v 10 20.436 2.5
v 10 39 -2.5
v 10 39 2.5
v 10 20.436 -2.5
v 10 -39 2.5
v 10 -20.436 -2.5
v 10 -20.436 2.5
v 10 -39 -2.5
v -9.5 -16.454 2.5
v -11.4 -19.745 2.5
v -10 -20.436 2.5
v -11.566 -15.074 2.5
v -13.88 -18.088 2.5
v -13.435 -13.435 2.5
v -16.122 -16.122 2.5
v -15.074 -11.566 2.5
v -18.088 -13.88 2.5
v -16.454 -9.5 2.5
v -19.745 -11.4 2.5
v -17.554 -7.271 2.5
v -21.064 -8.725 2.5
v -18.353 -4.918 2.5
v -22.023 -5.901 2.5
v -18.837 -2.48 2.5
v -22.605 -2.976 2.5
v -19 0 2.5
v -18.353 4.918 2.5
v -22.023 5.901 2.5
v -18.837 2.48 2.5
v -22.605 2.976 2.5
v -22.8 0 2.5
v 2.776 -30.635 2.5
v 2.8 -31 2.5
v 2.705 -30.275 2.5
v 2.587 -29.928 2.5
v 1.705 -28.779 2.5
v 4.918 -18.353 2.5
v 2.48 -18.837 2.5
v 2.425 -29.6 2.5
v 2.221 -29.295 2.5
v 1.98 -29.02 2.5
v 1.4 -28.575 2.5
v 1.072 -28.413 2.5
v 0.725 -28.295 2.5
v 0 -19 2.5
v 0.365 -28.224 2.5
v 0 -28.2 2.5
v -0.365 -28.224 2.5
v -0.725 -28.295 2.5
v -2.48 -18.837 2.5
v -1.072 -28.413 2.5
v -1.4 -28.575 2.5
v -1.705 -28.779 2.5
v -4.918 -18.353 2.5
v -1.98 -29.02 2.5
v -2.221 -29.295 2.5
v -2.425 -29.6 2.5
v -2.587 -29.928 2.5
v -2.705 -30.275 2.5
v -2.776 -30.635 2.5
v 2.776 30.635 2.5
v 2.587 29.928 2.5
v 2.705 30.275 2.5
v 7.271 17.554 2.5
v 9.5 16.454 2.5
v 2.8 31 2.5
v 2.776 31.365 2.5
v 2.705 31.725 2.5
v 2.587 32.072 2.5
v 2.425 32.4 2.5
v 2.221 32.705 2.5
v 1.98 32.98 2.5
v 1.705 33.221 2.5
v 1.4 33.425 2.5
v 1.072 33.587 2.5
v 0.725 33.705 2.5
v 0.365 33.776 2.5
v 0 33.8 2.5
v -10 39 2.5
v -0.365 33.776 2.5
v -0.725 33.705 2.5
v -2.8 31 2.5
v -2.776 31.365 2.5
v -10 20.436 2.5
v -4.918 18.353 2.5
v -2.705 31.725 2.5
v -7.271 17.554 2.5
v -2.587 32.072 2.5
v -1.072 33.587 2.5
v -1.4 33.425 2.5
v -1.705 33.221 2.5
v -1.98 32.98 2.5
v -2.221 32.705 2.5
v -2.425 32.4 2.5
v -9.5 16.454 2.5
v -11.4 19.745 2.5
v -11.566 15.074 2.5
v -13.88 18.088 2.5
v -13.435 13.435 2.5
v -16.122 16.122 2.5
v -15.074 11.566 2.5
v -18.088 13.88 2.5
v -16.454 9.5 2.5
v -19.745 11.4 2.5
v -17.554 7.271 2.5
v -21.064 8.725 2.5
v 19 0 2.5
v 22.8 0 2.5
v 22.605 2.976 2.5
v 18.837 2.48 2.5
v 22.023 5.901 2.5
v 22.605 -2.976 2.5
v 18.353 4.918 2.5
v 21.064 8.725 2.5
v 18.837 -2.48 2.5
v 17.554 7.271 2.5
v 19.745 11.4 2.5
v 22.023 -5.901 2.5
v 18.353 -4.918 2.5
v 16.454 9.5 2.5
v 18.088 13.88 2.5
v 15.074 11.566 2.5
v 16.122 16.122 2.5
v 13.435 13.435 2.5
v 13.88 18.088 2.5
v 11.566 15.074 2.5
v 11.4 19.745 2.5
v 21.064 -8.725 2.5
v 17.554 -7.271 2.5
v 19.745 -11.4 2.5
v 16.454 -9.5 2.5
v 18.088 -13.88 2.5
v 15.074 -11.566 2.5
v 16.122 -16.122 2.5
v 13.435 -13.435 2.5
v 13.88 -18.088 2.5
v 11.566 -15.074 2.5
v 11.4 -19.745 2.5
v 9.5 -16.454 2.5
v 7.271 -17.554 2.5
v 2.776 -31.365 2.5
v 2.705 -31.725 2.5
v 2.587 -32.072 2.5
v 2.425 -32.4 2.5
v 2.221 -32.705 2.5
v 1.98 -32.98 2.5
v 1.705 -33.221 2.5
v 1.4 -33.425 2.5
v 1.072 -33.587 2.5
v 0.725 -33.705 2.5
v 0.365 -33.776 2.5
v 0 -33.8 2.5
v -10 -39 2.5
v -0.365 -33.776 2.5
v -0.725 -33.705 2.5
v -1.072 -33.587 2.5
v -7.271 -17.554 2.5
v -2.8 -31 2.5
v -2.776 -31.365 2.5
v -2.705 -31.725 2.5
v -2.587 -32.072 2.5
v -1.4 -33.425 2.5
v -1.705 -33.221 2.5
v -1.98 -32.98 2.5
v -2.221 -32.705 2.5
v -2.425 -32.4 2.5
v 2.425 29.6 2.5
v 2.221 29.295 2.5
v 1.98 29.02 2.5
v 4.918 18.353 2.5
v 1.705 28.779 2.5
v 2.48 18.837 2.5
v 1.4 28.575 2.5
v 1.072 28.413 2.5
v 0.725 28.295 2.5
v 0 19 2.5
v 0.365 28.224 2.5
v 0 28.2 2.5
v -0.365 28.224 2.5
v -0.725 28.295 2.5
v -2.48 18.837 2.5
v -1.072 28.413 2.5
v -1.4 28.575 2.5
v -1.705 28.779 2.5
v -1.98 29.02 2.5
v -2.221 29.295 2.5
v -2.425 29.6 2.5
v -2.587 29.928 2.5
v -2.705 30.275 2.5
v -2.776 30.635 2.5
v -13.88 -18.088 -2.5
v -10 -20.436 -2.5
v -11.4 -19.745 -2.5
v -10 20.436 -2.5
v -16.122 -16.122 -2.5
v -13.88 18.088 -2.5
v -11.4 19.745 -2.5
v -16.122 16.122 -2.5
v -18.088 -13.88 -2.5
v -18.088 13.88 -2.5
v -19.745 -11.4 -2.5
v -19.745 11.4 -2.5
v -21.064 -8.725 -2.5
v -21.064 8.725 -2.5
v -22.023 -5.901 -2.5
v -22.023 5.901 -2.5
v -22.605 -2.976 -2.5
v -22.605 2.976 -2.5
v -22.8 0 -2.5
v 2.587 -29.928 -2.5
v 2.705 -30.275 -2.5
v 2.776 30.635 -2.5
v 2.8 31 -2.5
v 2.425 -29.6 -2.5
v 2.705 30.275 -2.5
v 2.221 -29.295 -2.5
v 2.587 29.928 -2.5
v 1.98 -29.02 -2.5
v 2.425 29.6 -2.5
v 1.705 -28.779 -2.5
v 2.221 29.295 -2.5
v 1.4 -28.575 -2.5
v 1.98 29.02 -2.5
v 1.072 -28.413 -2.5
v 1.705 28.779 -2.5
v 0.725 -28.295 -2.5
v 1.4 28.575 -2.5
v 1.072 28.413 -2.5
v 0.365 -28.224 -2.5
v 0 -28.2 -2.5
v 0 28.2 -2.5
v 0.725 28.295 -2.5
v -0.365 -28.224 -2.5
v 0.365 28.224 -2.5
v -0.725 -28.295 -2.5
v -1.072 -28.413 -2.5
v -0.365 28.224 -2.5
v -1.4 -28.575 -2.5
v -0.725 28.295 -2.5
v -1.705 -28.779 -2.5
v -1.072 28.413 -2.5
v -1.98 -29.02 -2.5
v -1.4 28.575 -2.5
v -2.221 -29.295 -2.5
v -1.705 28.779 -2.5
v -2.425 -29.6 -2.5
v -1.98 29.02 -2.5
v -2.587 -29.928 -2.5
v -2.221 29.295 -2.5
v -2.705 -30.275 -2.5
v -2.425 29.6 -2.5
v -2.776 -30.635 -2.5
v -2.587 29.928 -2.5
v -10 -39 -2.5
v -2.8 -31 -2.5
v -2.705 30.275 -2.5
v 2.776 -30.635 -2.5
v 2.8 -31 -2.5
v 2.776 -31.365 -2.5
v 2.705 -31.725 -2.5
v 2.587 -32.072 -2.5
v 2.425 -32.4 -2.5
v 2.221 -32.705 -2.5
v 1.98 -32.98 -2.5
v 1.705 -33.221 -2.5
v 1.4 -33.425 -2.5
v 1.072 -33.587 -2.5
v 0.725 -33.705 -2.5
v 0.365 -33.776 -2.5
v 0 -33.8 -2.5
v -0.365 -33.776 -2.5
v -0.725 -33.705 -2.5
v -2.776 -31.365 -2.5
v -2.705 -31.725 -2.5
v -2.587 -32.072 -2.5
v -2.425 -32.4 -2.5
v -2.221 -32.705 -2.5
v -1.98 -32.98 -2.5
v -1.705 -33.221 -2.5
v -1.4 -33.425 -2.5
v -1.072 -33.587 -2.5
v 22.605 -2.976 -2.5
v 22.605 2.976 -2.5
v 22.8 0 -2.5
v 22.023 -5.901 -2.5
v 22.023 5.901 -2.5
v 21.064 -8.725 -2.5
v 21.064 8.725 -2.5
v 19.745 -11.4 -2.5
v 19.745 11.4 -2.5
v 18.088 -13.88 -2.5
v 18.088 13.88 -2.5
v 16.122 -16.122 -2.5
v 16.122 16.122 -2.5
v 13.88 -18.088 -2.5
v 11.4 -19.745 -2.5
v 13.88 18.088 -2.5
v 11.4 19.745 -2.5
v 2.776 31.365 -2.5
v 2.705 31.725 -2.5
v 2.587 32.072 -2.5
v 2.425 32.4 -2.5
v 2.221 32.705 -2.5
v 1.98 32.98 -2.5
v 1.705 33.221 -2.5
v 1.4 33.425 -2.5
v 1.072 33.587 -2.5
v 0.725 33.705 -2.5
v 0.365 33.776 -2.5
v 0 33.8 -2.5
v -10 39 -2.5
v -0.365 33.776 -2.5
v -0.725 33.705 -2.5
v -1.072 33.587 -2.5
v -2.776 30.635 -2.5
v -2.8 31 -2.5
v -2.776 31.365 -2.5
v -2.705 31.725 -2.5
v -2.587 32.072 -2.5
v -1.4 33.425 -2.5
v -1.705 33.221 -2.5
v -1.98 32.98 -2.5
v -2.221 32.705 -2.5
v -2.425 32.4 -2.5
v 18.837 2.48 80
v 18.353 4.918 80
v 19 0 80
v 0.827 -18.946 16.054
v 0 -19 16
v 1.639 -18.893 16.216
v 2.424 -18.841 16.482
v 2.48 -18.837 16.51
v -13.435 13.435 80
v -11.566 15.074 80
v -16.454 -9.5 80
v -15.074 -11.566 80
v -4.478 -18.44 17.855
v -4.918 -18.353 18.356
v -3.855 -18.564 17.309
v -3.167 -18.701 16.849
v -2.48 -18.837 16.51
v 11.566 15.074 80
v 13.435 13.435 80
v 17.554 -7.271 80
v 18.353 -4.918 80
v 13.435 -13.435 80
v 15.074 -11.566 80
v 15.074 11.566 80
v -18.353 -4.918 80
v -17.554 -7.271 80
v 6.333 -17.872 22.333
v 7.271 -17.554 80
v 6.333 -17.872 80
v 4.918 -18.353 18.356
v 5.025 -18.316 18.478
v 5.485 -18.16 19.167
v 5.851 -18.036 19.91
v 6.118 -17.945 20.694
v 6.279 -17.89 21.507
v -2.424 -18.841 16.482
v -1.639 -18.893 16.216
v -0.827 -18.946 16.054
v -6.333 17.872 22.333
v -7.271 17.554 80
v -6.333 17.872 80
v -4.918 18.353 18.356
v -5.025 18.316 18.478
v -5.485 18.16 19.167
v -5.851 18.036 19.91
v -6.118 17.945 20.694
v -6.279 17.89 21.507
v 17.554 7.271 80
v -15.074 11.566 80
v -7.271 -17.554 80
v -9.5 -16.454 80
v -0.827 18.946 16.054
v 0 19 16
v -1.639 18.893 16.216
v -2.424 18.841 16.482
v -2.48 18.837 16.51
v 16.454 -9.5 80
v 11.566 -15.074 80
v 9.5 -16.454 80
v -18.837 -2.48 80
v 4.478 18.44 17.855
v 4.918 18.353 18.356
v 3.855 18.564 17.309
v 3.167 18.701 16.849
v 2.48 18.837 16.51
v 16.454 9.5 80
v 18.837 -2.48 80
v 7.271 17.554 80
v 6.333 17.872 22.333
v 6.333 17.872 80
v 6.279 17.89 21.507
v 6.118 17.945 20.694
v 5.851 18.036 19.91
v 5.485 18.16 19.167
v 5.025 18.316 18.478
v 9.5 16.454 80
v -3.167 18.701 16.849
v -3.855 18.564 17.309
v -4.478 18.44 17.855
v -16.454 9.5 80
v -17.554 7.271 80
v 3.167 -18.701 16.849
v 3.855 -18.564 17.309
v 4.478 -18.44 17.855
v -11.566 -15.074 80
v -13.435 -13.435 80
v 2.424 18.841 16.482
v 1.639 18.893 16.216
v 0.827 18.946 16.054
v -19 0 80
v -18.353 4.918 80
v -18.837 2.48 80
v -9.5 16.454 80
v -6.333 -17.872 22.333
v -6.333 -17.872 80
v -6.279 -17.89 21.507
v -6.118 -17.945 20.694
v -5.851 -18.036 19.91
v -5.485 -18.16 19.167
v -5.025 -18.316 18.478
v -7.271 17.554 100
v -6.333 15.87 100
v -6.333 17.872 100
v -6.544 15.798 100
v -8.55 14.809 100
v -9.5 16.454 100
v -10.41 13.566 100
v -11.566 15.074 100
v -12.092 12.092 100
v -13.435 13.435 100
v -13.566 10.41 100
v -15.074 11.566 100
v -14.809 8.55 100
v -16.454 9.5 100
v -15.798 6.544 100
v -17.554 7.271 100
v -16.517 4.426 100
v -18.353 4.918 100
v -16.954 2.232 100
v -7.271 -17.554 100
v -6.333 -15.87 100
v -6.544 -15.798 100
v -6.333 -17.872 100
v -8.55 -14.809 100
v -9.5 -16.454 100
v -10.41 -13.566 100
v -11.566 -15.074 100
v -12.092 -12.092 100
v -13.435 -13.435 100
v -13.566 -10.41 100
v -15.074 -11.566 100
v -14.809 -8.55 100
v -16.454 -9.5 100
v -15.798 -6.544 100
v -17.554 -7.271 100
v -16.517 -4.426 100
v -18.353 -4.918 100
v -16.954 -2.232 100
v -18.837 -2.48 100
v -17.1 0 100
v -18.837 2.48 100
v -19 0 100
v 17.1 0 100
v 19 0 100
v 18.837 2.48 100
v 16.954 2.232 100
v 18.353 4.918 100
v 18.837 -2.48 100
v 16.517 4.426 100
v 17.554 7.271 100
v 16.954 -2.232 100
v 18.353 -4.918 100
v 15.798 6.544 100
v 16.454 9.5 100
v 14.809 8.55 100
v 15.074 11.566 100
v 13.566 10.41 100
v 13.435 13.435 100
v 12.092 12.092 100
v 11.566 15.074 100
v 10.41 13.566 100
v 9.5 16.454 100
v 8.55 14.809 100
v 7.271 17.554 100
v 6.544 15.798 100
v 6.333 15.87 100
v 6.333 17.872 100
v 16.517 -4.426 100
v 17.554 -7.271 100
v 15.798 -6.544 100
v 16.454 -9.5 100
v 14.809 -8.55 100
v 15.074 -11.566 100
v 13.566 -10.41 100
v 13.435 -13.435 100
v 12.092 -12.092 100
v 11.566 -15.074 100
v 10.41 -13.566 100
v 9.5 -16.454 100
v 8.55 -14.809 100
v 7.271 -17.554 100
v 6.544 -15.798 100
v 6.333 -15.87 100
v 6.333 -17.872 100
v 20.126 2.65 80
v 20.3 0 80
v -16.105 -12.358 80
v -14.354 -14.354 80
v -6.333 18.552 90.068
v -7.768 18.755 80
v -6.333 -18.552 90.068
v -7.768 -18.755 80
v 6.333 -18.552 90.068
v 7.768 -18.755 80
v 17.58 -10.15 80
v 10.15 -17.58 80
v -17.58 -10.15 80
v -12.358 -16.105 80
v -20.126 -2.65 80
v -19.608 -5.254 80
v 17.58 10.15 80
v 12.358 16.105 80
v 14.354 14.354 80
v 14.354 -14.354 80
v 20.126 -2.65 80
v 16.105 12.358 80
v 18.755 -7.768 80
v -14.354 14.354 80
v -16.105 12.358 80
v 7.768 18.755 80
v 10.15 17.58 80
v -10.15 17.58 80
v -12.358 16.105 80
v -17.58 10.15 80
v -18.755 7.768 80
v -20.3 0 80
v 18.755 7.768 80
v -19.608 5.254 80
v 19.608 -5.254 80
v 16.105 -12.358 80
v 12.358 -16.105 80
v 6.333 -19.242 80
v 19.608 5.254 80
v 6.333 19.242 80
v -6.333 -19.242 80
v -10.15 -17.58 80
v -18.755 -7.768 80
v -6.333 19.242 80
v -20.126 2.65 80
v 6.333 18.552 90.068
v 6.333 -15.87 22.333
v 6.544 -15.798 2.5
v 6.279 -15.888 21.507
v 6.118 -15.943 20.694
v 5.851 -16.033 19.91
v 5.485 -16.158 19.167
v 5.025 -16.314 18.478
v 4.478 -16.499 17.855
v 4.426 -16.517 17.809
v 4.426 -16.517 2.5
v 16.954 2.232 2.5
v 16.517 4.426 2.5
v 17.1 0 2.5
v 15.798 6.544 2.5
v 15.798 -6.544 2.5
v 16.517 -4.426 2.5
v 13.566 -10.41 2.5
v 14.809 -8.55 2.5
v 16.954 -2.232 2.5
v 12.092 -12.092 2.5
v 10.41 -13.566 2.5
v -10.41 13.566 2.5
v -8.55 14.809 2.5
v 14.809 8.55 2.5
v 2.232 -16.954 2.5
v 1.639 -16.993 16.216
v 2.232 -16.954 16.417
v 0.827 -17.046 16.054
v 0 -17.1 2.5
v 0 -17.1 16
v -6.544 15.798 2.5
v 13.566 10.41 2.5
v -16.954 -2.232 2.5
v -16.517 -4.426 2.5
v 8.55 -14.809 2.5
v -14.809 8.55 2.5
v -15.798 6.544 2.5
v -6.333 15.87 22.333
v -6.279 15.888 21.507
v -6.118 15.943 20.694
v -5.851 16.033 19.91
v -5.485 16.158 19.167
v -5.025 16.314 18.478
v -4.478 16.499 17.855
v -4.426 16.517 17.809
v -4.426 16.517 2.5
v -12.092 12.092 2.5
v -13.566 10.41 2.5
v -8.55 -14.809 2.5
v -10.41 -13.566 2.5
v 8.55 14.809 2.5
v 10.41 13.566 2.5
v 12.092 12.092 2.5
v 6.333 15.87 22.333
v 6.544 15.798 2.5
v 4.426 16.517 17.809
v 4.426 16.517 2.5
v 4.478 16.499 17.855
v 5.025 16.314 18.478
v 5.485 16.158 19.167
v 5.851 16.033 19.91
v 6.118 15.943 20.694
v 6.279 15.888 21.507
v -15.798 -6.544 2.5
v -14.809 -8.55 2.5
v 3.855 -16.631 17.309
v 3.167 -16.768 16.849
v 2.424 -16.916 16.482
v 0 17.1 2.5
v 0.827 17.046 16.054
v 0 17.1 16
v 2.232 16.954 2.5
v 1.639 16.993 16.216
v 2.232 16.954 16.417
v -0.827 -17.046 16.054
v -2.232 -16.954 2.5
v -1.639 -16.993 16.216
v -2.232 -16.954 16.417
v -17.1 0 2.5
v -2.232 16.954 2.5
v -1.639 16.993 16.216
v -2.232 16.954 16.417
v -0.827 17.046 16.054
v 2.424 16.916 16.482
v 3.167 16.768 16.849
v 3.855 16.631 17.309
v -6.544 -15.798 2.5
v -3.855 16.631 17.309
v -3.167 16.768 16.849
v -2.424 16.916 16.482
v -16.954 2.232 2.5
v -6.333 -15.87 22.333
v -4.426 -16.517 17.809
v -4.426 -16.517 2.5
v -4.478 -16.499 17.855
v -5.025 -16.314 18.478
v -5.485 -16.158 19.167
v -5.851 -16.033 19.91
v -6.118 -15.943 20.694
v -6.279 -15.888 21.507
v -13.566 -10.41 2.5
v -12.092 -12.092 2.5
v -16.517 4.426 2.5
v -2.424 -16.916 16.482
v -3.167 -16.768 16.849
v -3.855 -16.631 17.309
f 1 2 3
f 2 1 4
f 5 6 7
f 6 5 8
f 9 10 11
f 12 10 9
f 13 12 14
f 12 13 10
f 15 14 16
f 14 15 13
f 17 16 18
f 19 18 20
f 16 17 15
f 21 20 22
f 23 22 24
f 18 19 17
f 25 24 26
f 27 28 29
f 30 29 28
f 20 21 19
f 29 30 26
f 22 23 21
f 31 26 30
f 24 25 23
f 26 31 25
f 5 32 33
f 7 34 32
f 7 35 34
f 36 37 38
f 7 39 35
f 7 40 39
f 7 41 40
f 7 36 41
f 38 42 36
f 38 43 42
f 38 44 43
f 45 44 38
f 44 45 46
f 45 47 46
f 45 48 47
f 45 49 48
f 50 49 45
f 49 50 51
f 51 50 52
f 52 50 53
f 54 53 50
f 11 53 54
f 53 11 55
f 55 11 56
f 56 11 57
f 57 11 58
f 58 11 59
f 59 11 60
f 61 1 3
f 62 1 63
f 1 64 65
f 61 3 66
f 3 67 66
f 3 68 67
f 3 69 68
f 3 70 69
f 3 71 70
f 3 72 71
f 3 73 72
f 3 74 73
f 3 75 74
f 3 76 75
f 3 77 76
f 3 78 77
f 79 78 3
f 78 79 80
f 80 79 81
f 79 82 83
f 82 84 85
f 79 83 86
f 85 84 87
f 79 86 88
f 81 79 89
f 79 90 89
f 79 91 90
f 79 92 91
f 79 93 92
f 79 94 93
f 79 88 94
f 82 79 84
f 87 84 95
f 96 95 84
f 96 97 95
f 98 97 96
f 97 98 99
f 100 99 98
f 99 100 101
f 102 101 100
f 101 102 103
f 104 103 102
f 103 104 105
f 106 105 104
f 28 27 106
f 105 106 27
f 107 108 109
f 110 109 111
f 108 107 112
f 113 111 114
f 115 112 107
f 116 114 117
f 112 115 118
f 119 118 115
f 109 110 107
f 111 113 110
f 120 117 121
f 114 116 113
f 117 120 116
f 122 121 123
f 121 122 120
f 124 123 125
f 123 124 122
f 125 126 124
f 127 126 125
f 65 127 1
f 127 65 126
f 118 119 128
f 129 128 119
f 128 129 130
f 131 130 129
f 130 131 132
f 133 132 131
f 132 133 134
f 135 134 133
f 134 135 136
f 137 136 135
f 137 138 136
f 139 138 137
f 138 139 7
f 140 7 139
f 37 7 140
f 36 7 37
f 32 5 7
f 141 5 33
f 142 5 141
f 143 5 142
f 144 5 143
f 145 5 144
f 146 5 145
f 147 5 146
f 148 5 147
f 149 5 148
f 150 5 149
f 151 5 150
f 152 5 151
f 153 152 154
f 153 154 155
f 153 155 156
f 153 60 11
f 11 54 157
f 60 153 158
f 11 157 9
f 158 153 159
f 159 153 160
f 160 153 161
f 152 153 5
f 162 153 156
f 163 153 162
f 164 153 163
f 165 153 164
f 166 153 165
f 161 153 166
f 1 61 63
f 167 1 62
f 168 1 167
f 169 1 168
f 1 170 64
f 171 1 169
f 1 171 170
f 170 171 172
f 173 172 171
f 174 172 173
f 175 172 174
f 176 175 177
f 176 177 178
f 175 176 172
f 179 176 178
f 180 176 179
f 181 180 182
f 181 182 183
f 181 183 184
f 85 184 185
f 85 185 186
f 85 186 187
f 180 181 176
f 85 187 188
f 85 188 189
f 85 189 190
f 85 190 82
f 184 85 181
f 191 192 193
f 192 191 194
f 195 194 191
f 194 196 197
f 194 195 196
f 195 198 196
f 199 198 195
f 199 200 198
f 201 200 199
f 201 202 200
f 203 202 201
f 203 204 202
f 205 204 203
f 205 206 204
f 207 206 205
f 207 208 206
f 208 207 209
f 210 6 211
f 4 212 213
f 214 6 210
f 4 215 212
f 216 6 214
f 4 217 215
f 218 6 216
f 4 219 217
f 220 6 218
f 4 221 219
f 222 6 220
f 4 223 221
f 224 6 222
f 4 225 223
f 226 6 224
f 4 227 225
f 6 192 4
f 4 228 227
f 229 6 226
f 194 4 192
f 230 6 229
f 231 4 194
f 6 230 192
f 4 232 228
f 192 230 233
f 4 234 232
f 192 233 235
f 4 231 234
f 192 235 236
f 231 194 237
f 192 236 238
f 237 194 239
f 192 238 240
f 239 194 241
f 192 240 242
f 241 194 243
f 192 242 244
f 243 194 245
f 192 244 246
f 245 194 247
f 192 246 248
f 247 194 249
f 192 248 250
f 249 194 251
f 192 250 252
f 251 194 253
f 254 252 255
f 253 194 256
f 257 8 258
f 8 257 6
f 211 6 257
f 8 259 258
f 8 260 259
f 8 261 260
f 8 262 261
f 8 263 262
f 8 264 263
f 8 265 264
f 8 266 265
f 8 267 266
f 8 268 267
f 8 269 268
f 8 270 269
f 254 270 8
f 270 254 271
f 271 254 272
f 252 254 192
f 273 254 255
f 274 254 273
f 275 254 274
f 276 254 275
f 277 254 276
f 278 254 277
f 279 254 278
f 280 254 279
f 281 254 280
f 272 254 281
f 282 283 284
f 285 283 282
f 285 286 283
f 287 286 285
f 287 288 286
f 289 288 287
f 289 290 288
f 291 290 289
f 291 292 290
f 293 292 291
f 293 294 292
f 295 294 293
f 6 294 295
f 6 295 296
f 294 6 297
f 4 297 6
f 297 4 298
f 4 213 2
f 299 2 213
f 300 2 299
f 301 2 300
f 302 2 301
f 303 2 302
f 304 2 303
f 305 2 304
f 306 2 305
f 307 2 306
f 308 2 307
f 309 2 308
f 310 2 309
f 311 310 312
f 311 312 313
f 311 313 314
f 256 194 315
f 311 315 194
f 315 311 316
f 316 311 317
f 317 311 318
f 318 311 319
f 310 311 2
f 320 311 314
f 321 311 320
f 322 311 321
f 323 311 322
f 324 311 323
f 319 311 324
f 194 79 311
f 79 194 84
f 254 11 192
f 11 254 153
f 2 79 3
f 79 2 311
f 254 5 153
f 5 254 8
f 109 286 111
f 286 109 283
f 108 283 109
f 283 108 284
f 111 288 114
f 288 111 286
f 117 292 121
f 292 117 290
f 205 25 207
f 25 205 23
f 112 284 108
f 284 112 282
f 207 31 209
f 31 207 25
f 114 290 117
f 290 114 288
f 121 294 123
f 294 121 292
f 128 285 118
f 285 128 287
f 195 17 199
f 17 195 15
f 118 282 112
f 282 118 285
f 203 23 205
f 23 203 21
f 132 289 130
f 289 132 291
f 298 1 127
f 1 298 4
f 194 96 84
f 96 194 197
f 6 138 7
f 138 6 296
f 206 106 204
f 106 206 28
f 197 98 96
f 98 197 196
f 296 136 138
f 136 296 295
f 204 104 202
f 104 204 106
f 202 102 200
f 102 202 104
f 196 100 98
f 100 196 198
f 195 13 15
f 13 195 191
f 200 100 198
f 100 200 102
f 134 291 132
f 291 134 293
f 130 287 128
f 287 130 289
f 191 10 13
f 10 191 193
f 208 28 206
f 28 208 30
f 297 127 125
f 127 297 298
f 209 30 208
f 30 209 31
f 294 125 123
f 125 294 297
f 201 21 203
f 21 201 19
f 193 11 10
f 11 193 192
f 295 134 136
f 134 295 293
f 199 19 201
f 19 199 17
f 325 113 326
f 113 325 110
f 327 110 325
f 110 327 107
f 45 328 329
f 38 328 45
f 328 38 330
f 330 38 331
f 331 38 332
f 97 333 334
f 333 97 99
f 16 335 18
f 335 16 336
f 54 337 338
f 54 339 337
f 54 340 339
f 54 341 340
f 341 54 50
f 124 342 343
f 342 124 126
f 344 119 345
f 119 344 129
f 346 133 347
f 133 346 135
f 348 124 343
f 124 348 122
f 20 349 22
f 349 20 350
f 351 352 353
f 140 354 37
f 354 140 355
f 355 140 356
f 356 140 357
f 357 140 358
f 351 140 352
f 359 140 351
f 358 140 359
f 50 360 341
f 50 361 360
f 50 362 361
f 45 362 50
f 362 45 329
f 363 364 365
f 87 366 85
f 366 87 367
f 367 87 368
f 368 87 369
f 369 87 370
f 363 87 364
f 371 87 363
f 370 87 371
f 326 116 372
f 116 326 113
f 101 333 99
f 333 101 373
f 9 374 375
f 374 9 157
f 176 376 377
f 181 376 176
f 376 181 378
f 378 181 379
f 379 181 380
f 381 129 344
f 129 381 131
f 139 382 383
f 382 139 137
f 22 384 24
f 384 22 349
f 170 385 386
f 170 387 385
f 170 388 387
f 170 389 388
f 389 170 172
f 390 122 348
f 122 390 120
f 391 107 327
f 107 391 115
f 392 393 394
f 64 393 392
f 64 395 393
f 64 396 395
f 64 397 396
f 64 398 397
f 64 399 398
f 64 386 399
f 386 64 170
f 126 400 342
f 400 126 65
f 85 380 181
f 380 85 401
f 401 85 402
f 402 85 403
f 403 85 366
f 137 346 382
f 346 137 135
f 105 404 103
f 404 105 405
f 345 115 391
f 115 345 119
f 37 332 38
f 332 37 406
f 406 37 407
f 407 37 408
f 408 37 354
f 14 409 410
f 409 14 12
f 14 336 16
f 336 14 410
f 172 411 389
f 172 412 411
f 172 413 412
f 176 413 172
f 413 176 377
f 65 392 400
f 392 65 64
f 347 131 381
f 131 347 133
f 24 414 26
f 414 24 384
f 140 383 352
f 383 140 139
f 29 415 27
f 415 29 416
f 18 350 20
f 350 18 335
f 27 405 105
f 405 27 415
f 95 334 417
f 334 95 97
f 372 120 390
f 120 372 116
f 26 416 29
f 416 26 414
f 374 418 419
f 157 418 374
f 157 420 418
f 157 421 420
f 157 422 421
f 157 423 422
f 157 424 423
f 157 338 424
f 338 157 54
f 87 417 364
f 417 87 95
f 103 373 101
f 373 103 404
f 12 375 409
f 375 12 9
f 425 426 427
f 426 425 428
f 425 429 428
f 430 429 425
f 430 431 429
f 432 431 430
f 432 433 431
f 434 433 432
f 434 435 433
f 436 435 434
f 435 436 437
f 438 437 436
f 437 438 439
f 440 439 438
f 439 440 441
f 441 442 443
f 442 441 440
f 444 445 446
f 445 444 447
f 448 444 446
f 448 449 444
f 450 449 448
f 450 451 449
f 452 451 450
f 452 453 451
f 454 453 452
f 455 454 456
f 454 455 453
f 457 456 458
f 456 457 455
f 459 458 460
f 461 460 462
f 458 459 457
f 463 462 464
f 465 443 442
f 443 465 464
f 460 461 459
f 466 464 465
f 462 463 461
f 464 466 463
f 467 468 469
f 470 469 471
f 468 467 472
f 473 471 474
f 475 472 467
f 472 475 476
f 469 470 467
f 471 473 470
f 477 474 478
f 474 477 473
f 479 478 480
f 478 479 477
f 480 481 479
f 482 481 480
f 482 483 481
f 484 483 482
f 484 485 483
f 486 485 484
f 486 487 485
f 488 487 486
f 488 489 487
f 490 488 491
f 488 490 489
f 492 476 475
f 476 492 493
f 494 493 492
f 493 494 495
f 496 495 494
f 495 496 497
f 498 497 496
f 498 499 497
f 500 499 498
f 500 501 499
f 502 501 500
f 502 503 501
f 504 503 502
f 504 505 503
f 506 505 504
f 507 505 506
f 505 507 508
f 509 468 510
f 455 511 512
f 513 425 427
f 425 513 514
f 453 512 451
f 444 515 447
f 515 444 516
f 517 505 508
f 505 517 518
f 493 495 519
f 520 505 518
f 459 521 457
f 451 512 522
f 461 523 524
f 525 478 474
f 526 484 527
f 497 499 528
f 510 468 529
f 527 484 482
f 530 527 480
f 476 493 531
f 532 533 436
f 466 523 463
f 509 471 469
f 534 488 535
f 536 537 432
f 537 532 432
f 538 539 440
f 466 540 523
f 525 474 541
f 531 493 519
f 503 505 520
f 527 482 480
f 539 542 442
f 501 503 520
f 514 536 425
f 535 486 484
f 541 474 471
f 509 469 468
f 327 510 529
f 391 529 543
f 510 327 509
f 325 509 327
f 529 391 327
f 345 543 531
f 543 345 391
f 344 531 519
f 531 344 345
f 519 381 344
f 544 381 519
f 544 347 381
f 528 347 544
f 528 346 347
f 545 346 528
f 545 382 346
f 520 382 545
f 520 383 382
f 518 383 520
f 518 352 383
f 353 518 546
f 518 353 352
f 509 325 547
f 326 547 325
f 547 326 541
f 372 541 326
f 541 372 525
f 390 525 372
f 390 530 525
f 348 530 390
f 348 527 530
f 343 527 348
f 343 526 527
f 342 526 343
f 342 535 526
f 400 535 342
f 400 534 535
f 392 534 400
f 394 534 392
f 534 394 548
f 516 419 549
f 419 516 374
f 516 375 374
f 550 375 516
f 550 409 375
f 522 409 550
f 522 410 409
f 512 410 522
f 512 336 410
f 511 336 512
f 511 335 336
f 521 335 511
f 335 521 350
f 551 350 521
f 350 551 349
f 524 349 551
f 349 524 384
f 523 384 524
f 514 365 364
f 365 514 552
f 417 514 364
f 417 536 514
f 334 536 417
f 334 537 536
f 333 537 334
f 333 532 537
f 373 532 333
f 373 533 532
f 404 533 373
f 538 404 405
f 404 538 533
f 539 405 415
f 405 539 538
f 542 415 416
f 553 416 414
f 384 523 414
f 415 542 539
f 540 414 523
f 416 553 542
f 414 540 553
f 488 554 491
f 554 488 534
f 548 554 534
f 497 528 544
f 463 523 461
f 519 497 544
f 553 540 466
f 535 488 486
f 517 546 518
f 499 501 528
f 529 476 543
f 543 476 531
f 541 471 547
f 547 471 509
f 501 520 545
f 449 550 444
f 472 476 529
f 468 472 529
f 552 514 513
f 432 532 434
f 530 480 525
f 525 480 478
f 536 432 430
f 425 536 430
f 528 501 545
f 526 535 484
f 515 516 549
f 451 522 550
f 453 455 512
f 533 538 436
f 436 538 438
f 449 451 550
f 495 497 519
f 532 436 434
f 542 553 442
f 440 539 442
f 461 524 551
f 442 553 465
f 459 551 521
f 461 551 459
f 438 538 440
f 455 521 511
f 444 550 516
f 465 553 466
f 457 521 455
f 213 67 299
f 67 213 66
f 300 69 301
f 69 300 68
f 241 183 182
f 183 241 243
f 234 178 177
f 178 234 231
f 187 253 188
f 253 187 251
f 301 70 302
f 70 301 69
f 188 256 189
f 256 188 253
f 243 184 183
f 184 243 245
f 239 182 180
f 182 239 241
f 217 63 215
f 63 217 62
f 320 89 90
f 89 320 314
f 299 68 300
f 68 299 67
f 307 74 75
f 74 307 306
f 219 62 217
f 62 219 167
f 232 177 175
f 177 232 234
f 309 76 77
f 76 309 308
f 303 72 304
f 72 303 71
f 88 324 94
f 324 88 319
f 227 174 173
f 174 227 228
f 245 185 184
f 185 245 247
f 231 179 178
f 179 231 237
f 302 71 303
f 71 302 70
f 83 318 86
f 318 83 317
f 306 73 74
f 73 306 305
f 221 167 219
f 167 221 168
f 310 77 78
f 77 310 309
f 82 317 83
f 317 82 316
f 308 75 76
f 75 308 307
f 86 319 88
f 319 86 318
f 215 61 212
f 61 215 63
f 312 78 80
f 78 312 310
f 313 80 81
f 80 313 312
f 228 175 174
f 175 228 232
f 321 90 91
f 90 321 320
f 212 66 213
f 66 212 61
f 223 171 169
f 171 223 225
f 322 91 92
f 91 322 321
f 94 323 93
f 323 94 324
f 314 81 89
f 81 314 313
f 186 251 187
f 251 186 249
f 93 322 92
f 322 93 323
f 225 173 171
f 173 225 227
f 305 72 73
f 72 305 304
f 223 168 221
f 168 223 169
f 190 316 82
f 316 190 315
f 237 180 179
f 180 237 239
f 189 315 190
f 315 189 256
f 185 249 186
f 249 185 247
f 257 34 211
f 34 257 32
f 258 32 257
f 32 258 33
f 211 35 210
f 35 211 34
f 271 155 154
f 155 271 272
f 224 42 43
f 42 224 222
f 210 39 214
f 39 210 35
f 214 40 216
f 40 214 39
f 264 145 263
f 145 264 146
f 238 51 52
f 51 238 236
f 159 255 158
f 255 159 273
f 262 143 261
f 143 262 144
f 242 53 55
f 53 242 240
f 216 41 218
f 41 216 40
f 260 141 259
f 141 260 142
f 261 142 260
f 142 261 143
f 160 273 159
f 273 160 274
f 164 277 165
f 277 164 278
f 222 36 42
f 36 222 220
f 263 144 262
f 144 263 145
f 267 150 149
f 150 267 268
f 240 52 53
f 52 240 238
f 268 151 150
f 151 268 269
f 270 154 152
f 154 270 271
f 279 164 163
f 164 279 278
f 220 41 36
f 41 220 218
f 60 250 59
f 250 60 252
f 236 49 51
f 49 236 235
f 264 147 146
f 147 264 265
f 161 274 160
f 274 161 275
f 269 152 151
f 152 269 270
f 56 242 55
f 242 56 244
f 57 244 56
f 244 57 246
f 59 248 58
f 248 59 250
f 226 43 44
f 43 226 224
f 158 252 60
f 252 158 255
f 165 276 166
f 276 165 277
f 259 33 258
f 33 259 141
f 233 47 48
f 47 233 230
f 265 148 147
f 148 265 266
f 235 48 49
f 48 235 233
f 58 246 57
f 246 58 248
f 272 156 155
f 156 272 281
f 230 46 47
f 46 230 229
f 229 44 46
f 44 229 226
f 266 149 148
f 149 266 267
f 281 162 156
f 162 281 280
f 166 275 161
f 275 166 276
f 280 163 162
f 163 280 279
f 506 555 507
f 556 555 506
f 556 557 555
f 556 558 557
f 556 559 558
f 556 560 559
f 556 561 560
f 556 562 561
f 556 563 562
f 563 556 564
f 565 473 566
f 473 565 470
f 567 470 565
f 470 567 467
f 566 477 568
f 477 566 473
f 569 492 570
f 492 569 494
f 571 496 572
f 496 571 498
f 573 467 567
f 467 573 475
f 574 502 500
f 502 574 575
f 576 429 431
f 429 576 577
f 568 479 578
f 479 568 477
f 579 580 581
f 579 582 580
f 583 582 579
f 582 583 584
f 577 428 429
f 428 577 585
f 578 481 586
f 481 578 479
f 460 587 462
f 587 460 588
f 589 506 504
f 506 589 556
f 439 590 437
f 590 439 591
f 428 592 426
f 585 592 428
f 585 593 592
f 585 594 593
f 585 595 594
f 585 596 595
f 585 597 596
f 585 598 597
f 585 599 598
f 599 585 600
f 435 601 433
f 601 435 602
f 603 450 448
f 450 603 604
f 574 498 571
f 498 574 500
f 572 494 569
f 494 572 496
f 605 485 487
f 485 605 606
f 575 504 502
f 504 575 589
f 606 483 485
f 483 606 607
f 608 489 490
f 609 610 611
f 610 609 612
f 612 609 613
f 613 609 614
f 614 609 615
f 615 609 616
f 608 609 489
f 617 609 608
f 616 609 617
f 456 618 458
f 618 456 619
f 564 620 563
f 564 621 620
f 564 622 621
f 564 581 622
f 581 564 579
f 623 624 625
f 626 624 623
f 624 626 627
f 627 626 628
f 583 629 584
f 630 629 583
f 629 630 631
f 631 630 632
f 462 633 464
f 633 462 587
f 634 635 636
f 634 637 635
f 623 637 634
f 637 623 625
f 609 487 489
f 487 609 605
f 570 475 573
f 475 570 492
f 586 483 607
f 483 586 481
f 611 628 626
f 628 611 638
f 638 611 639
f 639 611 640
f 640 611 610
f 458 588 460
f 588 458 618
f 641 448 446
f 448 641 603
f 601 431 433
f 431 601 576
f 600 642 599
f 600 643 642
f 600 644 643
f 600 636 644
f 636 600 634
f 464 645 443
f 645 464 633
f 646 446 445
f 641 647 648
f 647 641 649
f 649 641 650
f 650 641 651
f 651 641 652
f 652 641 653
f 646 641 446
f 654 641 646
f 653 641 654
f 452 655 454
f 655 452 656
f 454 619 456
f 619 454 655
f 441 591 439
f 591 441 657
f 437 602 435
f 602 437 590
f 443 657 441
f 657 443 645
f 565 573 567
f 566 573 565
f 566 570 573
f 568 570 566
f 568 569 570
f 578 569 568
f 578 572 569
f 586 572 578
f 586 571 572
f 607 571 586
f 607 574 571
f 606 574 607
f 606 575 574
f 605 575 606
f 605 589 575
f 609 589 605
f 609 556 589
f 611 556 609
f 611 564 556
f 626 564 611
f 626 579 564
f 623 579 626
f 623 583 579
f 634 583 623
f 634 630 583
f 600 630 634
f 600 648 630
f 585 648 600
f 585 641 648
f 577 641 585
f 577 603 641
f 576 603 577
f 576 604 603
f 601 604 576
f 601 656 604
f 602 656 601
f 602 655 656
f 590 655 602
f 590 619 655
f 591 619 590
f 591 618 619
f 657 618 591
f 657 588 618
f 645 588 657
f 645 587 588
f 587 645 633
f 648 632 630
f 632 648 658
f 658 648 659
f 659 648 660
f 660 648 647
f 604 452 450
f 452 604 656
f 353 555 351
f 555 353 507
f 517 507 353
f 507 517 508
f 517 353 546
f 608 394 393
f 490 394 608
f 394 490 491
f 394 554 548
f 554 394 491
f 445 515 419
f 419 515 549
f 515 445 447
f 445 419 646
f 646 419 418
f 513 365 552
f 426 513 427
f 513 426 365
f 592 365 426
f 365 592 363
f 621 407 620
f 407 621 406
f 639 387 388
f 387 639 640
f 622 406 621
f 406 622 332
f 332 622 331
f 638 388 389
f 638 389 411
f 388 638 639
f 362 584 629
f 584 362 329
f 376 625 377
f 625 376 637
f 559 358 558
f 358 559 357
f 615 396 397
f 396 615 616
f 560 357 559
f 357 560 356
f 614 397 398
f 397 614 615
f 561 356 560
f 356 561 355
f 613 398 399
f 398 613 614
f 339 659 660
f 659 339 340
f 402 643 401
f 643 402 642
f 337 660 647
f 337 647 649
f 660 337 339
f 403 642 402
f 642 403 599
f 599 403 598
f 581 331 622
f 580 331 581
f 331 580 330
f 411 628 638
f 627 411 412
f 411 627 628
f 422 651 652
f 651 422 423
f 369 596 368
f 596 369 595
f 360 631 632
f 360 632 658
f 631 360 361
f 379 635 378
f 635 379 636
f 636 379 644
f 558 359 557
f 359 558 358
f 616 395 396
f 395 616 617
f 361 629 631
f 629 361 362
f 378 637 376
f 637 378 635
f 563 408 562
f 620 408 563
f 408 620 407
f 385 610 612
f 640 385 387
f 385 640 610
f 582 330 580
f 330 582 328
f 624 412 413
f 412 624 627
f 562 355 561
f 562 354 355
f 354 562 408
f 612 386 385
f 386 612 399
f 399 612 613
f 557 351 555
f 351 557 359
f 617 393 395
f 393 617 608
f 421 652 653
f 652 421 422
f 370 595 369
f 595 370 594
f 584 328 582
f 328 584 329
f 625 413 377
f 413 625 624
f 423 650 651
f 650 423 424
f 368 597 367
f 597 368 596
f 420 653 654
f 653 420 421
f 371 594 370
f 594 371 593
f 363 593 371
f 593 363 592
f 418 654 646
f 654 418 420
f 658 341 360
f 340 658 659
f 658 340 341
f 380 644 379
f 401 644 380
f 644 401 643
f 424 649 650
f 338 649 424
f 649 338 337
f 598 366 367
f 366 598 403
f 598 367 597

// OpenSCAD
//custermizing data

//Takuya Yamaguchi 2014/5/25

//Core Diameter
CD=38; //[30:100]

//Reel Width
RW=80; //[40:120]

difference(){
union(){
cube([20,CD+40,5],center=true); // Screw Braket
translate([0,0,0])rotate([0,0,0])
cylinder(h=5, r=CD/2+CD*0.1,$fn=48,center=true); // Base Fringe
translate([0,0,(RW+20)/2])
cylinder(h=RW+20, r=CD/2,$fn=48,center=true); //main cylinder
translate([0,0,RW+10])
cylinder(h=20, r2=CD/2,r1=CD/2+1.3,$fn=48,center=true); //taper
}
translate([0,CD/2+12,0])rotate([0,0,0])
#cylinder(h=20, r=2.8,$fn=48,center=true); //screw hole
translate([0,-(CD/2+12),0])rotate([0,0,0])
#cylinder(h=20, r=2.8,$fn=48,center=true); // screw hole
translate([0,0,(RW+20)/2+5])
cylinder(h=RW+25, r=CD/2-CD*0.05,$fn=48,center=true); //inner clinder
translate([0,0,RW*0.2+(RW+20)/2+CD/6])rotate([0,0,0])
#cube([CD/3,CD+10,RW+20],center=true); //Slit 
translate([0,0,RW*0.2+CD/6])rotate([90,0,0])
#cylinder(h=RW+1, r=CD/6,$fn=48,center=true); //Slit R
}
